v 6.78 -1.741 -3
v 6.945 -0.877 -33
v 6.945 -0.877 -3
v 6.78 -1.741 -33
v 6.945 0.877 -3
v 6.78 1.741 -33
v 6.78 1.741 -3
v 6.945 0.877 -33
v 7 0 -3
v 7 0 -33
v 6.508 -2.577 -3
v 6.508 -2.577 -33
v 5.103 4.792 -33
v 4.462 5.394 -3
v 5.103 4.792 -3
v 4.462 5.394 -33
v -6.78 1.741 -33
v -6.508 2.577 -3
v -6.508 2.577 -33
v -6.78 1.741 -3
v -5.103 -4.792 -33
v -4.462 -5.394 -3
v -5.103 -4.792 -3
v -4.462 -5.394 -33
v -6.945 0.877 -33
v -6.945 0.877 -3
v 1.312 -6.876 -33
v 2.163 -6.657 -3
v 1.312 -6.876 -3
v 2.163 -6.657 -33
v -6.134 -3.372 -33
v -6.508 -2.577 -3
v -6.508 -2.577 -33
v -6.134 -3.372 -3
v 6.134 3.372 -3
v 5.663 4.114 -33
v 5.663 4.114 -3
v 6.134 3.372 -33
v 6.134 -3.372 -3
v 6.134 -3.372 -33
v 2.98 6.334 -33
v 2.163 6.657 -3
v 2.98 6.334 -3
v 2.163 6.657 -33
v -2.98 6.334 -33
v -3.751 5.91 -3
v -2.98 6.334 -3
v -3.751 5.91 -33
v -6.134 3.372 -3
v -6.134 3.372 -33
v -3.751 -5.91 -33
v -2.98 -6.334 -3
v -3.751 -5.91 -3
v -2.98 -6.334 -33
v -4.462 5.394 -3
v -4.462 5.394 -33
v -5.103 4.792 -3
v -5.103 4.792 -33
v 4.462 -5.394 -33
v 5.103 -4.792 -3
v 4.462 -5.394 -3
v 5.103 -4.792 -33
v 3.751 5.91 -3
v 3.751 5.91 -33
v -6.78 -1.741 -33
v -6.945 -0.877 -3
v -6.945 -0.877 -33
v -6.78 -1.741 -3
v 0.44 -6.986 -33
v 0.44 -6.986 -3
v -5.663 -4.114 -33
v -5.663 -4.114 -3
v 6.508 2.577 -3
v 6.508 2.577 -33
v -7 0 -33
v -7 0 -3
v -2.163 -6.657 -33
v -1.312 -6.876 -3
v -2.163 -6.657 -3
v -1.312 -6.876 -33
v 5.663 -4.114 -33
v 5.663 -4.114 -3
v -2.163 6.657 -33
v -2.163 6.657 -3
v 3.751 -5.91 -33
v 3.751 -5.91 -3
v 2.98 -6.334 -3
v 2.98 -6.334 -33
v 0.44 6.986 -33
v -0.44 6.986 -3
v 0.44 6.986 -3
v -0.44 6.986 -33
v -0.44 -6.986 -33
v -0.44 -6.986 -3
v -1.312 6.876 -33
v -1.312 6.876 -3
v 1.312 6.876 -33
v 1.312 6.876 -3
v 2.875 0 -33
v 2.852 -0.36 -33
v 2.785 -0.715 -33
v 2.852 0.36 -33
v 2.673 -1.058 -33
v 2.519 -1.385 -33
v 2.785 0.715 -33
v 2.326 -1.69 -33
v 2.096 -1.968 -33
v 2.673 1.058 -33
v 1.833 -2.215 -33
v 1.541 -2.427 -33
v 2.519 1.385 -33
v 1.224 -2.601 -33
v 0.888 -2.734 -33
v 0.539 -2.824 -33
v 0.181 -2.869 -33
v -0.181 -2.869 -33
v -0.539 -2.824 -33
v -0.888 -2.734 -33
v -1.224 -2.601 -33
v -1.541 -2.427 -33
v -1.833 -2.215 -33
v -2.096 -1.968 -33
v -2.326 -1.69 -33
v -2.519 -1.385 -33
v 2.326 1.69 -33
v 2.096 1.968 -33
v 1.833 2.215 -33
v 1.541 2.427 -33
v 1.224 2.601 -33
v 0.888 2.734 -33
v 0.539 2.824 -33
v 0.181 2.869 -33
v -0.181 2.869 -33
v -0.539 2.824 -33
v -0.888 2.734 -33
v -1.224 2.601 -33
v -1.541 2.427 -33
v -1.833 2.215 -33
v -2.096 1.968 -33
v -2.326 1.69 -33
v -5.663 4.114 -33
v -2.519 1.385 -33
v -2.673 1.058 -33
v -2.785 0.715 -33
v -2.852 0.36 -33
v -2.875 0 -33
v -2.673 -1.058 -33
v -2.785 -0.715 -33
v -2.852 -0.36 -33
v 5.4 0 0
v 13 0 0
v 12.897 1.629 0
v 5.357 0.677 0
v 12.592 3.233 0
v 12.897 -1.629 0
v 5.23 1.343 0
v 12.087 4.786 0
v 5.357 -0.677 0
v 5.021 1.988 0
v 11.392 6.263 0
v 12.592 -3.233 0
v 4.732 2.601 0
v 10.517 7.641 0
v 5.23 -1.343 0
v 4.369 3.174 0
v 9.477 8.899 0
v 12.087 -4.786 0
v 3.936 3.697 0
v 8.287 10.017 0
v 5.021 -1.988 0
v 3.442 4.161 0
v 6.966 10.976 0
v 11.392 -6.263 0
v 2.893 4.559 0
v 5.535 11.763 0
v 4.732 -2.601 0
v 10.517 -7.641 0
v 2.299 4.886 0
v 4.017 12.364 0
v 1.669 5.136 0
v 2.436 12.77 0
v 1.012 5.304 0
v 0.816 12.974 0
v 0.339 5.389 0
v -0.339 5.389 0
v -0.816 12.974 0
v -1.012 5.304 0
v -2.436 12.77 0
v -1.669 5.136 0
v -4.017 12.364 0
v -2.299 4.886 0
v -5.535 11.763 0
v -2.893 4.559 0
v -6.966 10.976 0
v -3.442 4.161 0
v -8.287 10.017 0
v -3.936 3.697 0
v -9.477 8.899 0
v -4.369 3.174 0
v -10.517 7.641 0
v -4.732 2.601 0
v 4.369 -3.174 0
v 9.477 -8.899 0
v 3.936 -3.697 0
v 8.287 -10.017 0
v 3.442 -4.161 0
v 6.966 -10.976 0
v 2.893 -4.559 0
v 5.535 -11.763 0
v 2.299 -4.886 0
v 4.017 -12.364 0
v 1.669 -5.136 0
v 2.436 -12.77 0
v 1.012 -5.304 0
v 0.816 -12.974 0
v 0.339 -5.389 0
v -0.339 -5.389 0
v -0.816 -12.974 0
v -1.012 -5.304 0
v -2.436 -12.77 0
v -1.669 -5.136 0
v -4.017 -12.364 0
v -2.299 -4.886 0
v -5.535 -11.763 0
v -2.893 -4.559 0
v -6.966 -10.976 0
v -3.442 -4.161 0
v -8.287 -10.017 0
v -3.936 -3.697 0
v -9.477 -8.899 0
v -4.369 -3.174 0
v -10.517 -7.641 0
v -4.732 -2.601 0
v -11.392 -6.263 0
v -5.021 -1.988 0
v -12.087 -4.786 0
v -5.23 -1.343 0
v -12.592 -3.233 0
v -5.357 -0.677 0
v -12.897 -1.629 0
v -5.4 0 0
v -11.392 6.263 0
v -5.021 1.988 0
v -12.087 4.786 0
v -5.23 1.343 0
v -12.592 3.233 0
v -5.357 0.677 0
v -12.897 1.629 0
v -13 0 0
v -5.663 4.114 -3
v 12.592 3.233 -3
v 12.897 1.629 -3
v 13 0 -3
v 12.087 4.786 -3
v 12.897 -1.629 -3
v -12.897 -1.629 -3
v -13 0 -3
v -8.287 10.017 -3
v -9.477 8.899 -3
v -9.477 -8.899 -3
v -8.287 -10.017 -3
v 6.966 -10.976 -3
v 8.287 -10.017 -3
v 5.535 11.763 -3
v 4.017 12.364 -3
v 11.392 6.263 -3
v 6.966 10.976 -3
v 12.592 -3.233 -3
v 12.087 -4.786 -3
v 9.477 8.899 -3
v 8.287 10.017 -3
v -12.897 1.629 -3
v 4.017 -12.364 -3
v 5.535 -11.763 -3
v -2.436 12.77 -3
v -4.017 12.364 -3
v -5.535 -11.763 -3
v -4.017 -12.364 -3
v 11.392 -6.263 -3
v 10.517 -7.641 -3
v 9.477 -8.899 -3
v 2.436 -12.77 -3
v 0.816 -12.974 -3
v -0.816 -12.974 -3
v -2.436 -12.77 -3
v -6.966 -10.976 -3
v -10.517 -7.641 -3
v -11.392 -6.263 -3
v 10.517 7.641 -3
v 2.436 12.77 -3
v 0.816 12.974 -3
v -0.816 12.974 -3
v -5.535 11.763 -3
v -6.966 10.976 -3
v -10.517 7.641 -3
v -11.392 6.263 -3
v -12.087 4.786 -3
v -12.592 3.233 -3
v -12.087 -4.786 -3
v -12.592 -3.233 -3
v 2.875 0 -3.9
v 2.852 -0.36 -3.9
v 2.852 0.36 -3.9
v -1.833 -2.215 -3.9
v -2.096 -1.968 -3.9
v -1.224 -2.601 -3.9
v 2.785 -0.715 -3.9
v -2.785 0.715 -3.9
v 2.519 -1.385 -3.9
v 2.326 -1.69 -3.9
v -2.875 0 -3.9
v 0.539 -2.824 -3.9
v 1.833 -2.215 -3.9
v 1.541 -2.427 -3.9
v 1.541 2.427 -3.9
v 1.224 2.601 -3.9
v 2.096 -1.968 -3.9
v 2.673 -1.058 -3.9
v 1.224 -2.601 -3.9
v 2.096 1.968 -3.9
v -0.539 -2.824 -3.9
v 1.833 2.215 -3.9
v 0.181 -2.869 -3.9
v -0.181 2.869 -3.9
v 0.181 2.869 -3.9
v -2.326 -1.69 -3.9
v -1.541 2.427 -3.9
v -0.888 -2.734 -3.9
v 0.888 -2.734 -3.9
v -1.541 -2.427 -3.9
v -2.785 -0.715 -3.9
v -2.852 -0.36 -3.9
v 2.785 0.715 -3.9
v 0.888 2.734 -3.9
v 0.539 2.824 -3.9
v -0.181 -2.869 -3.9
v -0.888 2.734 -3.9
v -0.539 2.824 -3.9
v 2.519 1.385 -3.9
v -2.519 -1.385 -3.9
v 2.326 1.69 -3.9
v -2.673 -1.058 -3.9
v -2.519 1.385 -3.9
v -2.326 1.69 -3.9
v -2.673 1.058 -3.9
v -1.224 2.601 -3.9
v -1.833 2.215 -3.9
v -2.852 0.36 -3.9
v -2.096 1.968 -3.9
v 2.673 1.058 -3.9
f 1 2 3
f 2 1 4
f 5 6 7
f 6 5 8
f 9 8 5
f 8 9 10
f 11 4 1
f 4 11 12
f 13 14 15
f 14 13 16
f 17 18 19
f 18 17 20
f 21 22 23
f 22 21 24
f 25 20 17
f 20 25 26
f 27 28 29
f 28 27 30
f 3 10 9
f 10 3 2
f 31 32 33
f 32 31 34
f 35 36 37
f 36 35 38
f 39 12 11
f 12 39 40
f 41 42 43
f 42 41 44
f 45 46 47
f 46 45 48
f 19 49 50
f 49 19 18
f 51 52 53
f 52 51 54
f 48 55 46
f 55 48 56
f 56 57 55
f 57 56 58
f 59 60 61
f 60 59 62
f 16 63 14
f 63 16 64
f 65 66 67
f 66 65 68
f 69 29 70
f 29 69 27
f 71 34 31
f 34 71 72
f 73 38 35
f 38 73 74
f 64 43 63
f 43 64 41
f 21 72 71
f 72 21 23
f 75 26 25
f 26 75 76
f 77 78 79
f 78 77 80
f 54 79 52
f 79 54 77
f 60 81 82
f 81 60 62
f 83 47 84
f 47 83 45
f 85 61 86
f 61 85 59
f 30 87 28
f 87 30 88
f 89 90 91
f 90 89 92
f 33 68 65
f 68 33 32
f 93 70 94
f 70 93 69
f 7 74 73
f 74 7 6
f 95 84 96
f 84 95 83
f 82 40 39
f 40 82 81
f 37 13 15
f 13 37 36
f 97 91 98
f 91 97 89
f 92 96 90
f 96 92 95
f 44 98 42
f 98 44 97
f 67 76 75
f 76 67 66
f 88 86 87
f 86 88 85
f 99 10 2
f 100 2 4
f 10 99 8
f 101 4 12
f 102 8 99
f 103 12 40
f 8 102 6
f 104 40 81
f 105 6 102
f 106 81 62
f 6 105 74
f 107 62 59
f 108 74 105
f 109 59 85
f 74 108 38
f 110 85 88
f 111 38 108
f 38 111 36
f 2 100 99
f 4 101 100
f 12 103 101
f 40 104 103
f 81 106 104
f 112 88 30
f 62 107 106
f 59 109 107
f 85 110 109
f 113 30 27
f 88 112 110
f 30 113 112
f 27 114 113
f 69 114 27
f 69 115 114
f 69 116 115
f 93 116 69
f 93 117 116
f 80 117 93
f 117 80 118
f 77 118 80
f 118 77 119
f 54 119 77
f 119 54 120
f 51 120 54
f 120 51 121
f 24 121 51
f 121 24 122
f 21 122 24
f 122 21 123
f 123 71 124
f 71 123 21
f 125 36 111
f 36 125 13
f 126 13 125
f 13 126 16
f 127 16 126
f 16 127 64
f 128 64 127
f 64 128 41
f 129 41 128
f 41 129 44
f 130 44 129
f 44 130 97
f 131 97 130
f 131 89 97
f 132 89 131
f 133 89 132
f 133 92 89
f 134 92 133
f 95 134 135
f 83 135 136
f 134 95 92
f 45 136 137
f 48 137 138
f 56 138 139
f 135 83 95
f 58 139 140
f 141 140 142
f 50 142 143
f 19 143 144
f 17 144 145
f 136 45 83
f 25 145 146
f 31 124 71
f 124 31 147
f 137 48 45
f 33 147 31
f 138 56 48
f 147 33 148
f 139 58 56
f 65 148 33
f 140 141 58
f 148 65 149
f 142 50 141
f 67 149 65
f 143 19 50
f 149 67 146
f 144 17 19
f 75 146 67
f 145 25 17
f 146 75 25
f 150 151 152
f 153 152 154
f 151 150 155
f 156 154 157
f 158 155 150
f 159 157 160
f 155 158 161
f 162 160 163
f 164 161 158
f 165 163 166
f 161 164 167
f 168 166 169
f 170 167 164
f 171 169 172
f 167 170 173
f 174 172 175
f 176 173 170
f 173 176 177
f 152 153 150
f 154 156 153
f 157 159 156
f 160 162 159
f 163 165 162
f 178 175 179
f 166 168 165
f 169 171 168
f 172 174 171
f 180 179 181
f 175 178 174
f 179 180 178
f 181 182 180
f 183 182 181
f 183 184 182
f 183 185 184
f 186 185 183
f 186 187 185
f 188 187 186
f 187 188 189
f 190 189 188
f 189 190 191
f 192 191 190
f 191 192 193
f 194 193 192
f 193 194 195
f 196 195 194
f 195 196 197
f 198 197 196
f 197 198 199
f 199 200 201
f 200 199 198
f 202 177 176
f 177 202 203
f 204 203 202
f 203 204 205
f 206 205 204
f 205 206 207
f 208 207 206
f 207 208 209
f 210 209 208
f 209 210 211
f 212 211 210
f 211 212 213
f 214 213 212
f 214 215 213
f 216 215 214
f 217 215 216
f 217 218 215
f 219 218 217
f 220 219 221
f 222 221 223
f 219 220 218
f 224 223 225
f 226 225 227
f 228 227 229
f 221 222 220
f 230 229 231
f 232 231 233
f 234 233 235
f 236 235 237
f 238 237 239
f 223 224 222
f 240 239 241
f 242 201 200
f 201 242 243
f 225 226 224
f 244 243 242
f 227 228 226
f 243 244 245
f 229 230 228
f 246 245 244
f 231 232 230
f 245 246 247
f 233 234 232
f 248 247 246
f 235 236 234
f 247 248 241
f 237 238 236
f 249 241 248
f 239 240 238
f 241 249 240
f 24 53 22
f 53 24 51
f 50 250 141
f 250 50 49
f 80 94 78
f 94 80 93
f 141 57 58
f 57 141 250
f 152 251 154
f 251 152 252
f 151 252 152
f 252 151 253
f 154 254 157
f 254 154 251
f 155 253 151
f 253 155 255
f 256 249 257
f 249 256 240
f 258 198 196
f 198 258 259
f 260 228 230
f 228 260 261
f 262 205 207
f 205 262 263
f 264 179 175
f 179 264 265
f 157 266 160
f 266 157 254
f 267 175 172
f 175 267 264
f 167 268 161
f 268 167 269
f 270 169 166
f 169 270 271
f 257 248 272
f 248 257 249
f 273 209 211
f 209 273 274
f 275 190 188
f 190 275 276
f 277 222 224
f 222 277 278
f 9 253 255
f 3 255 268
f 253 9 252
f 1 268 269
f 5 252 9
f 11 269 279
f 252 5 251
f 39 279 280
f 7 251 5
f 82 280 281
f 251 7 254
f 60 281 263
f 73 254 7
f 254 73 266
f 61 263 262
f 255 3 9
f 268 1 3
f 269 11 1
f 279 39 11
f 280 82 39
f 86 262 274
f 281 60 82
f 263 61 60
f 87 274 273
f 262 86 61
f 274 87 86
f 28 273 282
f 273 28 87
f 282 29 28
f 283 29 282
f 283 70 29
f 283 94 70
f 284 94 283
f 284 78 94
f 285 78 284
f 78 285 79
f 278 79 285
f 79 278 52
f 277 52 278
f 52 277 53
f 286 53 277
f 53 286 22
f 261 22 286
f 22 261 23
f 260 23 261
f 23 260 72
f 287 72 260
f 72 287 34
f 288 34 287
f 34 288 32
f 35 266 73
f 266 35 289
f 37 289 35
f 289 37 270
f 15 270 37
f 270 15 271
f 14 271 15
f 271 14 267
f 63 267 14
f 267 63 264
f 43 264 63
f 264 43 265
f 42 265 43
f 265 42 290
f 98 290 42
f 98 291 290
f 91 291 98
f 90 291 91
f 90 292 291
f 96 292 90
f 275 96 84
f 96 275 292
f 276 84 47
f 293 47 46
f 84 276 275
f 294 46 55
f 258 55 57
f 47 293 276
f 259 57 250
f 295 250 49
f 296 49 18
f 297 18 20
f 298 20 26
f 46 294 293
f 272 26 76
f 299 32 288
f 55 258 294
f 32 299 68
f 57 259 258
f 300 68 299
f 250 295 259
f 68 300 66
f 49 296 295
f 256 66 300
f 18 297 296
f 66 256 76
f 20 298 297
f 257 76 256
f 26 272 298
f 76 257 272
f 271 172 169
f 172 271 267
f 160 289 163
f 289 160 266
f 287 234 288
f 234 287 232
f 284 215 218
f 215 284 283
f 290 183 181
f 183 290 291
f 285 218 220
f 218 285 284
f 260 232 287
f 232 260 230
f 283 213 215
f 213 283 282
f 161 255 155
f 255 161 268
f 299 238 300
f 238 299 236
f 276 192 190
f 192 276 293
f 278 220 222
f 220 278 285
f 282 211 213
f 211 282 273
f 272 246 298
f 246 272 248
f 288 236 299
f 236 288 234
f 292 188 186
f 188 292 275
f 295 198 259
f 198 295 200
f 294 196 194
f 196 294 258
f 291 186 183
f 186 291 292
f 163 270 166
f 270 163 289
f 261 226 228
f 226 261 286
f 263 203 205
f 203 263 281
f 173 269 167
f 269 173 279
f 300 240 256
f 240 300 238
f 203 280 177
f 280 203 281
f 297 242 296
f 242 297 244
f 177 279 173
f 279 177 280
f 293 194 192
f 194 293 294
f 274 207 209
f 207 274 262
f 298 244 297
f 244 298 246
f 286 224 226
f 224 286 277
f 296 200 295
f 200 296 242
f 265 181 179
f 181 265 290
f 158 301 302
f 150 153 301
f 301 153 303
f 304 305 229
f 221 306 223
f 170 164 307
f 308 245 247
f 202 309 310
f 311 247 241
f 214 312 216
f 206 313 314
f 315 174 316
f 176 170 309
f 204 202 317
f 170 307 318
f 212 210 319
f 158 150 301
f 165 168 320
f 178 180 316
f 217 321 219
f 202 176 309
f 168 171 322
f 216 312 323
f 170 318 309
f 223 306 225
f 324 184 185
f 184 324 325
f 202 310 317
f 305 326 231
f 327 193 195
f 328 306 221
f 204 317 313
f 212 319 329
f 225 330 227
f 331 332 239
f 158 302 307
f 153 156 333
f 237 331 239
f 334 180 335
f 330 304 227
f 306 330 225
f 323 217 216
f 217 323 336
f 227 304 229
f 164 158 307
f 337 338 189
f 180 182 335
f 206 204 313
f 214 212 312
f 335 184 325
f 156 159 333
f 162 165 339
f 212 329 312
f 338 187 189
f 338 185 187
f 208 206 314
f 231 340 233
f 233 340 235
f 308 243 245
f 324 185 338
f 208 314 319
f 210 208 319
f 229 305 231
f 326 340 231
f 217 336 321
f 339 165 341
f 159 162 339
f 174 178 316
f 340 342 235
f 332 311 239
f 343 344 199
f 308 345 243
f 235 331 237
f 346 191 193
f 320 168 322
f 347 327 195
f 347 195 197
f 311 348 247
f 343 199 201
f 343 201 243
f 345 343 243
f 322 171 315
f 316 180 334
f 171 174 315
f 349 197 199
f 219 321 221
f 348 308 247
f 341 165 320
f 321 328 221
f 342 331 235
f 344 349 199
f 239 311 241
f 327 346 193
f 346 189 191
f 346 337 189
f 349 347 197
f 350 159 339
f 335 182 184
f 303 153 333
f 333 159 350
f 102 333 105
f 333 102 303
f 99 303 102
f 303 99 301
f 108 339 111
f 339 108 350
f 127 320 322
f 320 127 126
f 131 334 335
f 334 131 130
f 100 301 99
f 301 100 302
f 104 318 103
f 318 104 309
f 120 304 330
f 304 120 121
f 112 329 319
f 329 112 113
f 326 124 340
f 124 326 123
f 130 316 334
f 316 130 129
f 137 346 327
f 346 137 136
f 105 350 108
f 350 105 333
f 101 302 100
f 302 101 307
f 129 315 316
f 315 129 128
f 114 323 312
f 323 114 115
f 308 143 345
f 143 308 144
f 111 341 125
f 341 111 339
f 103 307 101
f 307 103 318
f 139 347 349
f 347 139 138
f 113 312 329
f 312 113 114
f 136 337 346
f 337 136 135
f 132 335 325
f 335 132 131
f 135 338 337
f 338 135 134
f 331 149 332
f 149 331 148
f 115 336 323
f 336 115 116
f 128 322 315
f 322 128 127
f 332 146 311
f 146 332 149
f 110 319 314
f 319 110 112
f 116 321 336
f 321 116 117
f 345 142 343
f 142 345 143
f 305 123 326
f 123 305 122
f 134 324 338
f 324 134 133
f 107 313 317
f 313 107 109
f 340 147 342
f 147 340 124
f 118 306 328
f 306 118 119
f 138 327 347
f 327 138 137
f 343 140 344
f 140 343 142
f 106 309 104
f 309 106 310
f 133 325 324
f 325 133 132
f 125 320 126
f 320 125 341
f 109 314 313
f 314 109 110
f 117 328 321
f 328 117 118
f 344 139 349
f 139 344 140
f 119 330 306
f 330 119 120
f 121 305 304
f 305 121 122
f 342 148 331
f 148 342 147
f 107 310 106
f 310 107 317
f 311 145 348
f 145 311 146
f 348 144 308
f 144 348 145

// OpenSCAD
$fn = 50;


difference() {
	union() {
		translate(v = [0, 0, -33.0000000000]) {
			cylinder(h = 33, r = 7.0000000000);
		}
		translate(v = [0, 0, -3.0000000000]) {
			cylinder(h = 3, r = 13.0000000000);
		}
	}
	union() {
		translate(v = [0, 0, 0]) {
			rotate(a = [0, 0, 0]) {
				difference() {
					union() {
						#translate(v = [0, 0, -33.0000000000]) {
							cylinder(h = 33, r = 2.6000000000);
						}
						#translate(v = [0, 0, -3.9000000000]) {
							cylinder(h = 3.9000000000, r = 7.0000000000, r1 = 2.8750000000, r2 = 5.4000000000);
						}
						#translate(v = [0, 0, -33.0000000000]) {
							cylinder(h = 33, r = 2.8750000000);
						}
						#translate(v = [0, 0, -33.0000000000]) {
							cylinder(h = 33, r = 2.6000000000);
						}
					}
					union();
				}
			}
		}
	}
}
